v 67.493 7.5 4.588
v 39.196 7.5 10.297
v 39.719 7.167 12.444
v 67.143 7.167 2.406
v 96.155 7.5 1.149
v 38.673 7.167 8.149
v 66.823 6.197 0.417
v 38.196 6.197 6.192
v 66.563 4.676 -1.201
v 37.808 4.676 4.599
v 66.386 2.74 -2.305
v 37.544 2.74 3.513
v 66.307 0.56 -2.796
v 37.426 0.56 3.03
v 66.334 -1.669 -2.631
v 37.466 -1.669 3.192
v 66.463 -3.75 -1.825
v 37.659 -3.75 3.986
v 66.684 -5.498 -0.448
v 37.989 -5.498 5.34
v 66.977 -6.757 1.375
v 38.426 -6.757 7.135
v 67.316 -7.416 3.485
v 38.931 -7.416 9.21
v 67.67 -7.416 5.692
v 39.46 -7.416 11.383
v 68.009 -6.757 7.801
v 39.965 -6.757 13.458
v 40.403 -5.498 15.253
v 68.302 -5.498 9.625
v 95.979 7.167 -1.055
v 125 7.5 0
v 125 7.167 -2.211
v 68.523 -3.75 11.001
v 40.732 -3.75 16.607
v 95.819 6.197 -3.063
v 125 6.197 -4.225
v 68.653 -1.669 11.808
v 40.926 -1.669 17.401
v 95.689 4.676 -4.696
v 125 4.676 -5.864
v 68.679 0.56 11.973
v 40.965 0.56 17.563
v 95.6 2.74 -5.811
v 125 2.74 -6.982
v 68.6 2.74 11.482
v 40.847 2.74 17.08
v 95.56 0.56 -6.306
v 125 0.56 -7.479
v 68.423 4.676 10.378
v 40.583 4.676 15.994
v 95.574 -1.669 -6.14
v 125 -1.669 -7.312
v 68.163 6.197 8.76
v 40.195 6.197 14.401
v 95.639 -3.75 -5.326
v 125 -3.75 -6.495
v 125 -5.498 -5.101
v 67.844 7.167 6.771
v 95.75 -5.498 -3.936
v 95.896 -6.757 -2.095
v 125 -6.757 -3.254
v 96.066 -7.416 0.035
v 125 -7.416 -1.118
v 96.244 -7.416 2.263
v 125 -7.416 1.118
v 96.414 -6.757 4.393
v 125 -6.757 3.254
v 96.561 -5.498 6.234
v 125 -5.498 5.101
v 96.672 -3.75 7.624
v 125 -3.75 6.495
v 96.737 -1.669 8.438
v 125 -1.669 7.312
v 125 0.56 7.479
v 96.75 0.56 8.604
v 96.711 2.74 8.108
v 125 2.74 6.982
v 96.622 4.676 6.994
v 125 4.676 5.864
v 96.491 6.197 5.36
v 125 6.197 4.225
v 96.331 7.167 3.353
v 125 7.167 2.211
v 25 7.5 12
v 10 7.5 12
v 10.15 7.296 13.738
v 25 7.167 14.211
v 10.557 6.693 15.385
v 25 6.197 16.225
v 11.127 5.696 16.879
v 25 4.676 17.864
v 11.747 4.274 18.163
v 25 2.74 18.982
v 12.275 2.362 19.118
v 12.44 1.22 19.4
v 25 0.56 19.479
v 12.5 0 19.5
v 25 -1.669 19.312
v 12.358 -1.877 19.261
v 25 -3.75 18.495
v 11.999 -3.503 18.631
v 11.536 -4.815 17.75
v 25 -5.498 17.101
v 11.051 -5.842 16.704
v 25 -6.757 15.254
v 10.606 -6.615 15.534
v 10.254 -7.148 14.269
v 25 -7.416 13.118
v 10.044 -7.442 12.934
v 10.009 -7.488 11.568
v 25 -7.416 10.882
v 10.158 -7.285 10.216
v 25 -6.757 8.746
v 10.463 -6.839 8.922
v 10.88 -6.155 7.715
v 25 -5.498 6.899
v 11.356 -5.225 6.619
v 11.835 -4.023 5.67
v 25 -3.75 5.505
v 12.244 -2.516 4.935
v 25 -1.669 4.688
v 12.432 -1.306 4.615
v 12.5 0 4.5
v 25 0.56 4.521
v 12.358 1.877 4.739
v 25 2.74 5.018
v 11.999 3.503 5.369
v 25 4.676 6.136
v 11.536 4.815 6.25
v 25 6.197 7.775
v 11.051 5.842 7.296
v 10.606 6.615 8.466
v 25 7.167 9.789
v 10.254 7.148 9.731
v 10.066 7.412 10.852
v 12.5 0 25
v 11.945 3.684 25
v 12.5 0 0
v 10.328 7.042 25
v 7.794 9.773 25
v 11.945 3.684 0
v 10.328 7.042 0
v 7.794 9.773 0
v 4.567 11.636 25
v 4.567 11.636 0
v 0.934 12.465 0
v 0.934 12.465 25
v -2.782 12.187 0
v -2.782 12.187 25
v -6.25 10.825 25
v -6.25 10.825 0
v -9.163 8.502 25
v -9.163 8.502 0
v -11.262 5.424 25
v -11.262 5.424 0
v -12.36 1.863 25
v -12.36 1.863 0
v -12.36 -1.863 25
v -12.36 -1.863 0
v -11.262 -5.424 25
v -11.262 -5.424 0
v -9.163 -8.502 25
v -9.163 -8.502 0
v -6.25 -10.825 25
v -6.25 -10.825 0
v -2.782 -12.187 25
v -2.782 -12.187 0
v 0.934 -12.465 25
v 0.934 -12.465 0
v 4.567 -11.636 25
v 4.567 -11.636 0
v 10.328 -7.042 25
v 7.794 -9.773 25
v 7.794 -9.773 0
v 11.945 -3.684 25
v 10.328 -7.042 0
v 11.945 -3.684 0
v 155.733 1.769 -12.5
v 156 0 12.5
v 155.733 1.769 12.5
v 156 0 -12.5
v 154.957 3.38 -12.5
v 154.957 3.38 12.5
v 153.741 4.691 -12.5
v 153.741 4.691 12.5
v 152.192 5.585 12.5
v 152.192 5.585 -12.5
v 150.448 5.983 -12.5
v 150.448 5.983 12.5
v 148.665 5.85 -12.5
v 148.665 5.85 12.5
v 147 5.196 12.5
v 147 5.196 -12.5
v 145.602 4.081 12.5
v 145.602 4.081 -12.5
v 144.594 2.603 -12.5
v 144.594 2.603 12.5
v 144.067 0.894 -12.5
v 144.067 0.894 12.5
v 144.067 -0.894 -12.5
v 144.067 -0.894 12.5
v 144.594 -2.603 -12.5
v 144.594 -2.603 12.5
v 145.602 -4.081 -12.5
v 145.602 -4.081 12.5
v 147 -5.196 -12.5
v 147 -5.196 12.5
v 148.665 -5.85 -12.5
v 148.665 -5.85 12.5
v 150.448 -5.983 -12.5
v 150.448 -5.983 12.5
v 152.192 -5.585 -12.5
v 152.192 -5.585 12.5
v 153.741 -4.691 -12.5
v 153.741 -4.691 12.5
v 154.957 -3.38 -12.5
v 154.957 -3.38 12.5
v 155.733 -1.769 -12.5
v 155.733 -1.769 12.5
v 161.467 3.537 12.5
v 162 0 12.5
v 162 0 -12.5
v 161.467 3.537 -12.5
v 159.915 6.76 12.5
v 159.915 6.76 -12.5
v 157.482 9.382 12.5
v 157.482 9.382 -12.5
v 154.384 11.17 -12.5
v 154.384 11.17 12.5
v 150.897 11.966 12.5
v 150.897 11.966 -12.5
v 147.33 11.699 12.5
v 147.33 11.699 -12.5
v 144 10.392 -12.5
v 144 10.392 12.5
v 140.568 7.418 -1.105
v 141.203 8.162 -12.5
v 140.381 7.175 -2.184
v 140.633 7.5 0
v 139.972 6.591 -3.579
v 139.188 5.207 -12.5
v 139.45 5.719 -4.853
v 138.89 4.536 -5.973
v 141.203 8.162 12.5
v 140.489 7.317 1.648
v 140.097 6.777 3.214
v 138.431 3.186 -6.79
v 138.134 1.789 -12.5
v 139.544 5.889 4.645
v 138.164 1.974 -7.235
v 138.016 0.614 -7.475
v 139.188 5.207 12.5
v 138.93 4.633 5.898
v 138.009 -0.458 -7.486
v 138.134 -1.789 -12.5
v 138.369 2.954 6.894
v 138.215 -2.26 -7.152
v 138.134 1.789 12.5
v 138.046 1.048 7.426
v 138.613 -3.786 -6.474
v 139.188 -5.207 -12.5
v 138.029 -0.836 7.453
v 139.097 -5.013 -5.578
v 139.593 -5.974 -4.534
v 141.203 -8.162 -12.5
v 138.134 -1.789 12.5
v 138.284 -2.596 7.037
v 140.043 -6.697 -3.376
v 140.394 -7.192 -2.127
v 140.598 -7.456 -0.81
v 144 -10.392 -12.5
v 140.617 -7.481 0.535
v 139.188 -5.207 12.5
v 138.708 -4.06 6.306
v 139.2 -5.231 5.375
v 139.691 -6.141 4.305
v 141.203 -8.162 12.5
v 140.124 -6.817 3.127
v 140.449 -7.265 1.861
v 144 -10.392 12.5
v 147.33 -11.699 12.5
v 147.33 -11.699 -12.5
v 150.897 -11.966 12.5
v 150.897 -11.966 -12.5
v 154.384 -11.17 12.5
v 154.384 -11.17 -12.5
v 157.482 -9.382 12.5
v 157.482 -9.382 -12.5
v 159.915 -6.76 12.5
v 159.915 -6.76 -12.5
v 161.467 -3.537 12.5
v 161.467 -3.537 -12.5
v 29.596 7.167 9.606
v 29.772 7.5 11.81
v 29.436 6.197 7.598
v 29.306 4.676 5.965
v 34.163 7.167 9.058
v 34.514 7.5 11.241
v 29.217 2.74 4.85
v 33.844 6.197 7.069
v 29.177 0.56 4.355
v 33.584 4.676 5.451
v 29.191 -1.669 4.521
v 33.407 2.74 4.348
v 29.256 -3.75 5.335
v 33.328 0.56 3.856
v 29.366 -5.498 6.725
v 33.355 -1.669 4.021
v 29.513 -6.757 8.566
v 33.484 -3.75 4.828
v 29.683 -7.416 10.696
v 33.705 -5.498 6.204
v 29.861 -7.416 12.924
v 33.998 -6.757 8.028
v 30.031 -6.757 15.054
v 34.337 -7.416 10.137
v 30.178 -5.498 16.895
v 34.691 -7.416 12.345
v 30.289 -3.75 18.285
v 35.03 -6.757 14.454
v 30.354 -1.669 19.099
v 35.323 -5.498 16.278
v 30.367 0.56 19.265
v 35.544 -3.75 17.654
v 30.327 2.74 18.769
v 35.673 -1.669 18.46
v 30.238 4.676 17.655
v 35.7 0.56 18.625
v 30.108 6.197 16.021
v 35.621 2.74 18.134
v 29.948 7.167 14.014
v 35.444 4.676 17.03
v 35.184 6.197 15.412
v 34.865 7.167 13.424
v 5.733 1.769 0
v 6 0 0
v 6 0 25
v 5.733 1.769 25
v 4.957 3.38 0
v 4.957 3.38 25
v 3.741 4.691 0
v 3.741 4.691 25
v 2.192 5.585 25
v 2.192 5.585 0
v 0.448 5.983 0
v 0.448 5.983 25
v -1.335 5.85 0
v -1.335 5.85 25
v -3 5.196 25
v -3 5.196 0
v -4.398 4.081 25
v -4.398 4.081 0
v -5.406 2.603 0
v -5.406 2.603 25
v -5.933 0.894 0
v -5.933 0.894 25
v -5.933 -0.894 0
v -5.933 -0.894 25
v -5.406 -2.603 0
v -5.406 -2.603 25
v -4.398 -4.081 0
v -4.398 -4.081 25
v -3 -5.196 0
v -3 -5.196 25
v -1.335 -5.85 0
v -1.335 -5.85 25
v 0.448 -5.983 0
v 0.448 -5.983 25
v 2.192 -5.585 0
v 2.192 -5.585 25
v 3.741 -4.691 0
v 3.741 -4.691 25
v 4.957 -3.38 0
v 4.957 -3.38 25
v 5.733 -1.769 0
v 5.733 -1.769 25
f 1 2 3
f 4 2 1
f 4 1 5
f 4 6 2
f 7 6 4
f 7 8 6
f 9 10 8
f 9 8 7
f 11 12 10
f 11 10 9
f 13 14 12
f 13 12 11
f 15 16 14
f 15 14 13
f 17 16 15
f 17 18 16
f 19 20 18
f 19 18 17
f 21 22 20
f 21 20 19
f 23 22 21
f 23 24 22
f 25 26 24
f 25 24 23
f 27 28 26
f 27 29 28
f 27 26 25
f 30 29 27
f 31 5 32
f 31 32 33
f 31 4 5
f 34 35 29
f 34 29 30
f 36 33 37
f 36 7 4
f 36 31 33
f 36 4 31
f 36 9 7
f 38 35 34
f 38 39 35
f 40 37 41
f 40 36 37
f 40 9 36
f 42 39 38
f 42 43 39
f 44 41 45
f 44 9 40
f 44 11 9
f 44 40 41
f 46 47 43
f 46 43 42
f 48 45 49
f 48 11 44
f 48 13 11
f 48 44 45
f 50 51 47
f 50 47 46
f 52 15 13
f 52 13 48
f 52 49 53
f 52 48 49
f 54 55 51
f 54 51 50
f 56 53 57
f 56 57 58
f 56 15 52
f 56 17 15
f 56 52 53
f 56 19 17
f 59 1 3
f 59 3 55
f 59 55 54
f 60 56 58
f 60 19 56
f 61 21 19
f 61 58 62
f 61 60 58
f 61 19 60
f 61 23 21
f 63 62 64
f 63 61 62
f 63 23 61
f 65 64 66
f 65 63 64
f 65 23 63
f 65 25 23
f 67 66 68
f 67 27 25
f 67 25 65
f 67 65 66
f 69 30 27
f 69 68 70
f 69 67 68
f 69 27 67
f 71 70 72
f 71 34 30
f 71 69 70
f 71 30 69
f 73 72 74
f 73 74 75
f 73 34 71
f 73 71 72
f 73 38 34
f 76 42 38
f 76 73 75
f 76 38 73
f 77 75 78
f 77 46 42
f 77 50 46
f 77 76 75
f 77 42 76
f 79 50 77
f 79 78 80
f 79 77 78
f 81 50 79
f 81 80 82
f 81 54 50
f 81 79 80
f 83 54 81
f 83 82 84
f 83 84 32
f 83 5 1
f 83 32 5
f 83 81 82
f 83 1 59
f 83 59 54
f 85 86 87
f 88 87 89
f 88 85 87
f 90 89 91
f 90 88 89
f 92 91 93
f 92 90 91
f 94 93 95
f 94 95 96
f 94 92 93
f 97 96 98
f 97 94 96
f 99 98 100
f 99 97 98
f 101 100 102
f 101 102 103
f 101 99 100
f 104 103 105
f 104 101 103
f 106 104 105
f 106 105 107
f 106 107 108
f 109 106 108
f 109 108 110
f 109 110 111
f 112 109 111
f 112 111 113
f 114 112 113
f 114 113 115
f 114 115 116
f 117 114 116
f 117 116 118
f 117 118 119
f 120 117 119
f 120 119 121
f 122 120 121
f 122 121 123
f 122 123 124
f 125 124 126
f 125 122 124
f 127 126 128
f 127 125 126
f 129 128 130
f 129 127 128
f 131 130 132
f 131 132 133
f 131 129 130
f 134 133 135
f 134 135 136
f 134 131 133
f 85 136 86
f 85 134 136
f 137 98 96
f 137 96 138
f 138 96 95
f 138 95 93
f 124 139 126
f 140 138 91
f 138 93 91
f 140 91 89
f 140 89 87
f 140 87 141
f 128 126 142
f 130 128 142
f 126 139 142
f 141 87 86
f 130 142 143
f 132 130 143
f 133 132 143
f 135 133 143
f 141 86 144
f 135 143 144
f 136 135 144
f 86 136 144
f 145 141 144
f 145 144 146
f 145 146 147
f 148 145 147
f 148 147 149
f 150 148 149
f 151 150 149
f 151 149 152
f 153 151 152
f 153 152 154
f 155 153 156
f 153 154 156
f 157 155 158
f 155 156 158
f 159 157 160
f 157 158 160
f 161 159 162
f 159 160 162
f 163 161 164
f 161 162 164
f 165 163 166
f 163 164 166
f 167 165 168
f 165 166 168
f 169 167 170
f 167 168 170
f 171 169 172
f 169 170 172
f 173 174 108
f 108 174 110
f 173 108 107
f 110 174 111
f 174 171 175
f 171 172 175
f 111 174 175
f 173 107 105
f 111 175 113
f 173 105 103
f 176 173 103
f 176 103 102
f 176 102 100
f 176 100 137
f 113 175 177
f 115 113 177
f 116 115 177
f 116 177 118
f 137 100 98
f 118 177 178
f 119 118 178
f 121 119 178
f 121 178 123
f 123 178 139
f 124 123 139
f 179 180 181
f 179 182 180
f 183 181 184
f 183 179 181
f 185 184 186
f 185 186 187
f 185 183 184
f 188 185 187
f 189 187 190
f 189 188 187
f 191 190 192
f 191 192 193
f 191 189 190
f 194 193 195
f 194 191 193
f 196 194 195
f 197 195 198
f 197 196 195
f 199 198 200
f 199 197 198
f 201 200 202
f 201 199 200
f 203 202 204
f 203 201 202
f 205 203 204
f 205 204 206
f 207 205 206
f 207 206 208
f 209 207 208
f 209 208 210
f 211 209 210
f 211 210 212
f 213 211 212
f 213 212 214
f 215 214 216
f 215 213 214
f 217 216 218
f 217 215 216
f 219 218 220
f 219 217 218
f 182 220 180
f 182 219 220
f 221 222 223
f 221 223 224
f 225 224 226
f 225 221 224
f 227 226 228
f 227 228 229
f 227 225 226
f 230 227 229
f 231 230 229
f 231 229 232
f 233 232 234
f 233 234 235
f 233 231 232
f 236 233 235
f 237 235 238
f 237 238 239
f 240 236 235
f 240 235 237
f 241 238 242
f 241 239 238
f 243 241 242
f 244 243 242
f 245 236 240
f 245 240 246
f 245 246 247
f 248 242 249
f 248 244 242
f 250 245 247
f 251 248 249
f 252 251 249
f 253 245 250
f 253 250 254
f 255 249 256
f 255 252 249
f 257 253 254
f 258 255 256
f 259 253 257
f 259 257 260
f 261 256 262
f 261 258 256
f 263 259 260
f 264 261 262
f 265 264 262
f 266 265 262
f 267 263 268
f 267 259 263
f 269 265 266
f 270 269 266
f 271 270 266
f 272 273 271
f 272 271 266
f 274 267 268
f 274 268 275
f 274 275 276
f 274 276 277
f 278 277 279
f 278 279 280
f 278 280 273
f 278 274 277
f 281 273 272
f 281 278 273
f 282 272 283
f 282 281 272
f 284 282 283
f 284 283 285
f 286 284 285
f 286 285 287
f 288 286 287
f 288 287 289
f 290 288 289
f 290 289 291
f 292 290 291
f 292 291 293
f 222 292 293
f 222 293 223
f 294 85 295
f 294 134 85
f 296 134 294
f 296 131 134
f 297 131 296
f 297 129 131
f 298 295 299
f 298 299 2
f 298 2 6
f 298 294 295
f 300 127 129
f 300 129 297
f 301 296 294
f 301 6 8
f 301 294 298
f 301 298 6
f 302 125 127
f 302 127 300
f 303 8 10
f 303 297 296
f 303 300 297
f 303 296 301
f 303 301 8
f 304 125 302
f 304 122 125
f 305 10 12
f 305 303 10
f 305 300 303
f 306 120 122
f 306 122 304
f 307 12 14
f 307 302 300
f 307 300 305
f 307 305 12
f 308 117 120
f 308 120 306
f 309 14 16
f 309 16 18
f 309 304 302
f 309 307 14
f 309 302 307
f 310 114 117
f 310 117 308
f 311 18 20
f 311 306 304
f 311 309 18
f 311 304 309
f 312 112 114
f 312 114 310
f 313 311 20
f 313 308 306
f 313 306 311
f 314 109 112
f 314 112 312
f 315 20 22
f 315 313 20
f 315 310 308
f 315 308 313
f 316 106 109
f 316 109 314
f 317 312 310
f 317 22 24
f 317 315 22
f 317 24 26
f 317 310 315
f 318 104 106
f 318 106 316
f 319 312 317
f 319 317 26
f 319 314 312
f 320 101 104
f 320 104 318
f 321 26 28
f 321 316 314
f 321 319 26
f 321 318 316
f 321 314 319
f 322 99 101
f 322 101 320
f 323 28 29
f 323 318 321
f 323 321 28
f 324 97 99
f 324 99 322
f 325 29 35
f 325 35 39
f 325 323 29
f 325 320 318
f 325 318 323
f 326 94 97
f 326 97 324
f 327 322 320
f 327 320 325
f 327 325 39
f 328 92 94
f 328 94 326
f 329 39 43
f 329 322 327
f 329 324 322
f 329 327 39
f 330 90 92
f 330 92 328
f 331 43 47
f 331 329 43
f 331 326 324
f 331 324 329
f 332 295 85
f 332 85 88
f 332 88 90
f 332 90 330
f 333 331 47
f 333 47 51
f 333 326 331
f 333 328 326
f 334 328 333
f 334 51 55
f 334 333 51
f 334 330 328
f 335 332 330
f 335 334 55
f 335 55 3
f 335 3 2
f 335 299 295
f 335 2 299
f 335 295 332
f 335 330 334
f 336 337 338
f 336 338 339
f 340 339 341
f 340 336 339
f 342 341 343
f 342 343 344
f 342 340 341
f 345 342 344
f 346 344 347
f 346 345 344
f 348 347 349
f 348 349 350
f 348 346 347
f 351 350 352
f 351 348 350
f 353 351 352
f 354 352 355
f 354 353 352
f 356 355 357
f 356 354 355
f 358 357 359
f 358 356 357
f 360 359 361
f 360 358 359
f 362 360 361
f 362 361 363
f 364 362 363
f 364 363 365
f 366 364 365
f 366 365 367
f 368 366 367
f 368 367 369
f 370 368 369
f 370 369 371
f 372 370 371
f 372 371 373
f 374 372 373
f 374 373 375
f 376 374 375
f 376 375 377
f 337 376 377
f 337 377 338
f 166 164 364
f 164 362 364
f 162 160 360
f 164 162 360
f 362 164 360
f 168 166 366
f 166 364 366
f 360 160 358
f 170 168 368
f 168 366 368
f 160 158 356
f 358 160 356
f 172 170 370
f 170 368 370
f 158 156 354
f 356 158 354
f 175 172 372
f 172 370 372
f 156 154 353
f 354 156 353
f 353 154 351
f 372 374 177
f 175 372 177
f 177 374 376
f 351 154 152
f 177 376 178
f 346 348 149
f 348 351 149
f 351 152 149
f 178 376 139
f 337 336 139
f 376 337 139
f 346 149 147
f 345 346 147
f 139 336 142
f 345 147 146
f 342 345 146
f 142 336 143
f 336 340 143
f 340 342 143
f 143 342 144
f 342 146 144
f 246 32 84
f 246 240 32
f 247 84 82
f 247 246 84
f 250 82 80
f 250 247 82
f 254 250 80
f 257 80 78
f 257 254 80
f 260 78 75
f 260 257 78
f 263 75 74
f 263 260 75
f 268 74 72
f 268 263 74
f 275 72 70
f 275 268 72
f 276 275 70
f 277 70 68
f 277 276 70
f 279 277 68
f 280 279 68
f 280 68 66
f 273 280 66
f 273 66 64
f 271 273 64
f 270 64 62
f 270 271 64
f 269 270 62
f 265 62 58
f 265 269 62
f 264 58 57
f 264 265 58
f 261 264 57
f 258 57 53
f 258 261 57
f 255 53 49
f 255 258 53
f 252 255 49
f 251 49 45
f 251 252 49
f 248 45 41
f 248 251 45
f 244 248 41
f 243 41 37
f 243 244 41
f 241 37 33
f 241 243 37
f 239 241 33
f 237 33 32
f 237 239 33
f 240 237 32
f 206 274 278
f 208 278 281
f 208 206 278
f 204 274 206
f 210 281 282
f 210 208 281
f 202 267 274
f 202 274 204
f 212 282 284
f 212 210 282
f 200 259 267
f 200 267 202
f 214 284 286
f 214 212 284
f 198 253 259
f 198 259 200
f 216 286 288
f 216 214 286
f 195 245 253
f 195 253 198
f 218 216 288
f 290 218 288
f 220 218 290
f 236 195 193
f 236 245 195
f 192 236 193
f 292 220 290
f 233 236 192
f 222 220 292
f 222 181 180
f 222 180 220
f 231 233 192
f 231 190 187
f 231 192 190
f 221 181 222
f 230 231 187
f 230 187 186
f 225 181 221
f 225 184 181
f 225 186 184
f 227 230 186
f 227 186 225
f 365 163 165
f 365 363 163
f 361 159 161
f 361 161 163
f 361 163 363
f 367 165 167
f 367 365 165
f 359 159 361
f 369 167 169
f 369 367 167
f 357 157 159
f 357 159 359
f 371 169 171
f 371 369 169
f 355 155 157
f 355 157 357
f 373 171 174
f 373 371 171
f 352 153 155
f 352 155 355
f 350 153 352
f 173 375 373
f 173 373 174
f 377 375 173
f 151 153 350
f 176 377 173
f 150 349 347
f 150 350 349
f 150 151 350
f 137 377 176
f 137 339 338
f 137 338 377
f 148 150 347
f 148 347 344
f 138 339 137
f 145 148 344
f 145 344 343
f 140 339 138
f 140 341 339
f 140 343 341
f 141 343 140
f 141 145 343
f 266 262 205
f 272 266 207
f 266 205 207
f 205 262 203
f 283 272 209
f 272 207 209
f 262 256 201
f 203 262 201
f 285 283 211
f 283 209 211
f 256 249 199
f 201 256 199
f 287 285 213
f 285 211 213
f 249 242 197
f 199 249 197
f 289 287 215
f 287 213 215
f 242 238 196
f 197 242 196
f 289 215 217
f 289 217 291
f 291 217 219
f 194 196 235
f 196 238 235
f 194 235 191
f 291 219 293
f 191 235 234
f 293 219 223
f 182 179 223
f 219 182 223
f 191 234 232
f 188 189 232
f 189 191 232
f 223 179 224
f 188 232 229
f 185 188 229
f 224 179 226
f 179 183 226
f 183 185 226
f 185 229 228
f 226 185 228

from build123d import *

# Parameters (mm, degrees)
F0_R          = 12.5
F0_R_2        = 6
F1_DEPTH      = 25
F3_R          = 12
F3_R_2        = 6
F4_DEPTH      = 12.5
F4_DEPTH_BACK = 12.5
F5_R          = 7.5
F7_R          = 6
F8_DEPTH      = 12.5010001
F8_DEPTH_BACK = 25.0010001


with BuildPart() as f1:
    # F0 (on Top) → F1 (new body)
    with BuildSketch(Plane.XY):
        Circle(F0_R)
        Circle(F0_R_2, mode=Mode.SUBTRACT)
    extrude(amount=F1_DEPTH)



with BuildPart() as f4:
    # F3 (on Top) → F4 (new body, two sides)
    with BuildSketch(Plane.XY) as f4_sk:
        with Locations((150, 0)):
            Circle(F3_R)
        with Locations((150, 0)):
            Circle(F3_R_2, mode=Mode.SUBTRACT)
    extrude(amount=F4_DEPTH)
    extrude(f4_sk.sketch, amount=-F4_DEPTH_BACK)


with BuildPart() as f1_1:
    add(f1.part)

    add(f4.part)  # F6 merges F4
    # F6: sweep along a path in F2
    with BuildLine(Plane.XZ) as f6_path:
        Line((0, 12), (25, 12))
        ThreePointArc((25, 12), (32.1487132371, 11.5726103092), (39.1955835962, 10.2965299685))
        ThreePointArc((39.1955835962, 10.2965299685), (81.789999989, 2.5833332421), (125, 0))
        Line((125, 0), (150, 0))
    # F5 (on Right) → F6 (sweep)
    with BuildSketch(Plane.YZ):
        with Locations((0, 12)):
            Circle(F5_R)
    sweep(path=f6_path.line)

    # F7 (on Top) → F8 (cut, two sides)
    with BuildSketch(Plane.XY) as f8_sk:
        Circle(F7_R)
        with Locations((150, 0)):
            Circle(F7_R)
    extrude(amount=-F8_DEPTH, mode=Mode.SUBTRACT)
    extrude(f8_sk.sketch, amount=F8_DEPTH_BACK, mode=Mode.SUBTRACT)


solid = f1_1.part
